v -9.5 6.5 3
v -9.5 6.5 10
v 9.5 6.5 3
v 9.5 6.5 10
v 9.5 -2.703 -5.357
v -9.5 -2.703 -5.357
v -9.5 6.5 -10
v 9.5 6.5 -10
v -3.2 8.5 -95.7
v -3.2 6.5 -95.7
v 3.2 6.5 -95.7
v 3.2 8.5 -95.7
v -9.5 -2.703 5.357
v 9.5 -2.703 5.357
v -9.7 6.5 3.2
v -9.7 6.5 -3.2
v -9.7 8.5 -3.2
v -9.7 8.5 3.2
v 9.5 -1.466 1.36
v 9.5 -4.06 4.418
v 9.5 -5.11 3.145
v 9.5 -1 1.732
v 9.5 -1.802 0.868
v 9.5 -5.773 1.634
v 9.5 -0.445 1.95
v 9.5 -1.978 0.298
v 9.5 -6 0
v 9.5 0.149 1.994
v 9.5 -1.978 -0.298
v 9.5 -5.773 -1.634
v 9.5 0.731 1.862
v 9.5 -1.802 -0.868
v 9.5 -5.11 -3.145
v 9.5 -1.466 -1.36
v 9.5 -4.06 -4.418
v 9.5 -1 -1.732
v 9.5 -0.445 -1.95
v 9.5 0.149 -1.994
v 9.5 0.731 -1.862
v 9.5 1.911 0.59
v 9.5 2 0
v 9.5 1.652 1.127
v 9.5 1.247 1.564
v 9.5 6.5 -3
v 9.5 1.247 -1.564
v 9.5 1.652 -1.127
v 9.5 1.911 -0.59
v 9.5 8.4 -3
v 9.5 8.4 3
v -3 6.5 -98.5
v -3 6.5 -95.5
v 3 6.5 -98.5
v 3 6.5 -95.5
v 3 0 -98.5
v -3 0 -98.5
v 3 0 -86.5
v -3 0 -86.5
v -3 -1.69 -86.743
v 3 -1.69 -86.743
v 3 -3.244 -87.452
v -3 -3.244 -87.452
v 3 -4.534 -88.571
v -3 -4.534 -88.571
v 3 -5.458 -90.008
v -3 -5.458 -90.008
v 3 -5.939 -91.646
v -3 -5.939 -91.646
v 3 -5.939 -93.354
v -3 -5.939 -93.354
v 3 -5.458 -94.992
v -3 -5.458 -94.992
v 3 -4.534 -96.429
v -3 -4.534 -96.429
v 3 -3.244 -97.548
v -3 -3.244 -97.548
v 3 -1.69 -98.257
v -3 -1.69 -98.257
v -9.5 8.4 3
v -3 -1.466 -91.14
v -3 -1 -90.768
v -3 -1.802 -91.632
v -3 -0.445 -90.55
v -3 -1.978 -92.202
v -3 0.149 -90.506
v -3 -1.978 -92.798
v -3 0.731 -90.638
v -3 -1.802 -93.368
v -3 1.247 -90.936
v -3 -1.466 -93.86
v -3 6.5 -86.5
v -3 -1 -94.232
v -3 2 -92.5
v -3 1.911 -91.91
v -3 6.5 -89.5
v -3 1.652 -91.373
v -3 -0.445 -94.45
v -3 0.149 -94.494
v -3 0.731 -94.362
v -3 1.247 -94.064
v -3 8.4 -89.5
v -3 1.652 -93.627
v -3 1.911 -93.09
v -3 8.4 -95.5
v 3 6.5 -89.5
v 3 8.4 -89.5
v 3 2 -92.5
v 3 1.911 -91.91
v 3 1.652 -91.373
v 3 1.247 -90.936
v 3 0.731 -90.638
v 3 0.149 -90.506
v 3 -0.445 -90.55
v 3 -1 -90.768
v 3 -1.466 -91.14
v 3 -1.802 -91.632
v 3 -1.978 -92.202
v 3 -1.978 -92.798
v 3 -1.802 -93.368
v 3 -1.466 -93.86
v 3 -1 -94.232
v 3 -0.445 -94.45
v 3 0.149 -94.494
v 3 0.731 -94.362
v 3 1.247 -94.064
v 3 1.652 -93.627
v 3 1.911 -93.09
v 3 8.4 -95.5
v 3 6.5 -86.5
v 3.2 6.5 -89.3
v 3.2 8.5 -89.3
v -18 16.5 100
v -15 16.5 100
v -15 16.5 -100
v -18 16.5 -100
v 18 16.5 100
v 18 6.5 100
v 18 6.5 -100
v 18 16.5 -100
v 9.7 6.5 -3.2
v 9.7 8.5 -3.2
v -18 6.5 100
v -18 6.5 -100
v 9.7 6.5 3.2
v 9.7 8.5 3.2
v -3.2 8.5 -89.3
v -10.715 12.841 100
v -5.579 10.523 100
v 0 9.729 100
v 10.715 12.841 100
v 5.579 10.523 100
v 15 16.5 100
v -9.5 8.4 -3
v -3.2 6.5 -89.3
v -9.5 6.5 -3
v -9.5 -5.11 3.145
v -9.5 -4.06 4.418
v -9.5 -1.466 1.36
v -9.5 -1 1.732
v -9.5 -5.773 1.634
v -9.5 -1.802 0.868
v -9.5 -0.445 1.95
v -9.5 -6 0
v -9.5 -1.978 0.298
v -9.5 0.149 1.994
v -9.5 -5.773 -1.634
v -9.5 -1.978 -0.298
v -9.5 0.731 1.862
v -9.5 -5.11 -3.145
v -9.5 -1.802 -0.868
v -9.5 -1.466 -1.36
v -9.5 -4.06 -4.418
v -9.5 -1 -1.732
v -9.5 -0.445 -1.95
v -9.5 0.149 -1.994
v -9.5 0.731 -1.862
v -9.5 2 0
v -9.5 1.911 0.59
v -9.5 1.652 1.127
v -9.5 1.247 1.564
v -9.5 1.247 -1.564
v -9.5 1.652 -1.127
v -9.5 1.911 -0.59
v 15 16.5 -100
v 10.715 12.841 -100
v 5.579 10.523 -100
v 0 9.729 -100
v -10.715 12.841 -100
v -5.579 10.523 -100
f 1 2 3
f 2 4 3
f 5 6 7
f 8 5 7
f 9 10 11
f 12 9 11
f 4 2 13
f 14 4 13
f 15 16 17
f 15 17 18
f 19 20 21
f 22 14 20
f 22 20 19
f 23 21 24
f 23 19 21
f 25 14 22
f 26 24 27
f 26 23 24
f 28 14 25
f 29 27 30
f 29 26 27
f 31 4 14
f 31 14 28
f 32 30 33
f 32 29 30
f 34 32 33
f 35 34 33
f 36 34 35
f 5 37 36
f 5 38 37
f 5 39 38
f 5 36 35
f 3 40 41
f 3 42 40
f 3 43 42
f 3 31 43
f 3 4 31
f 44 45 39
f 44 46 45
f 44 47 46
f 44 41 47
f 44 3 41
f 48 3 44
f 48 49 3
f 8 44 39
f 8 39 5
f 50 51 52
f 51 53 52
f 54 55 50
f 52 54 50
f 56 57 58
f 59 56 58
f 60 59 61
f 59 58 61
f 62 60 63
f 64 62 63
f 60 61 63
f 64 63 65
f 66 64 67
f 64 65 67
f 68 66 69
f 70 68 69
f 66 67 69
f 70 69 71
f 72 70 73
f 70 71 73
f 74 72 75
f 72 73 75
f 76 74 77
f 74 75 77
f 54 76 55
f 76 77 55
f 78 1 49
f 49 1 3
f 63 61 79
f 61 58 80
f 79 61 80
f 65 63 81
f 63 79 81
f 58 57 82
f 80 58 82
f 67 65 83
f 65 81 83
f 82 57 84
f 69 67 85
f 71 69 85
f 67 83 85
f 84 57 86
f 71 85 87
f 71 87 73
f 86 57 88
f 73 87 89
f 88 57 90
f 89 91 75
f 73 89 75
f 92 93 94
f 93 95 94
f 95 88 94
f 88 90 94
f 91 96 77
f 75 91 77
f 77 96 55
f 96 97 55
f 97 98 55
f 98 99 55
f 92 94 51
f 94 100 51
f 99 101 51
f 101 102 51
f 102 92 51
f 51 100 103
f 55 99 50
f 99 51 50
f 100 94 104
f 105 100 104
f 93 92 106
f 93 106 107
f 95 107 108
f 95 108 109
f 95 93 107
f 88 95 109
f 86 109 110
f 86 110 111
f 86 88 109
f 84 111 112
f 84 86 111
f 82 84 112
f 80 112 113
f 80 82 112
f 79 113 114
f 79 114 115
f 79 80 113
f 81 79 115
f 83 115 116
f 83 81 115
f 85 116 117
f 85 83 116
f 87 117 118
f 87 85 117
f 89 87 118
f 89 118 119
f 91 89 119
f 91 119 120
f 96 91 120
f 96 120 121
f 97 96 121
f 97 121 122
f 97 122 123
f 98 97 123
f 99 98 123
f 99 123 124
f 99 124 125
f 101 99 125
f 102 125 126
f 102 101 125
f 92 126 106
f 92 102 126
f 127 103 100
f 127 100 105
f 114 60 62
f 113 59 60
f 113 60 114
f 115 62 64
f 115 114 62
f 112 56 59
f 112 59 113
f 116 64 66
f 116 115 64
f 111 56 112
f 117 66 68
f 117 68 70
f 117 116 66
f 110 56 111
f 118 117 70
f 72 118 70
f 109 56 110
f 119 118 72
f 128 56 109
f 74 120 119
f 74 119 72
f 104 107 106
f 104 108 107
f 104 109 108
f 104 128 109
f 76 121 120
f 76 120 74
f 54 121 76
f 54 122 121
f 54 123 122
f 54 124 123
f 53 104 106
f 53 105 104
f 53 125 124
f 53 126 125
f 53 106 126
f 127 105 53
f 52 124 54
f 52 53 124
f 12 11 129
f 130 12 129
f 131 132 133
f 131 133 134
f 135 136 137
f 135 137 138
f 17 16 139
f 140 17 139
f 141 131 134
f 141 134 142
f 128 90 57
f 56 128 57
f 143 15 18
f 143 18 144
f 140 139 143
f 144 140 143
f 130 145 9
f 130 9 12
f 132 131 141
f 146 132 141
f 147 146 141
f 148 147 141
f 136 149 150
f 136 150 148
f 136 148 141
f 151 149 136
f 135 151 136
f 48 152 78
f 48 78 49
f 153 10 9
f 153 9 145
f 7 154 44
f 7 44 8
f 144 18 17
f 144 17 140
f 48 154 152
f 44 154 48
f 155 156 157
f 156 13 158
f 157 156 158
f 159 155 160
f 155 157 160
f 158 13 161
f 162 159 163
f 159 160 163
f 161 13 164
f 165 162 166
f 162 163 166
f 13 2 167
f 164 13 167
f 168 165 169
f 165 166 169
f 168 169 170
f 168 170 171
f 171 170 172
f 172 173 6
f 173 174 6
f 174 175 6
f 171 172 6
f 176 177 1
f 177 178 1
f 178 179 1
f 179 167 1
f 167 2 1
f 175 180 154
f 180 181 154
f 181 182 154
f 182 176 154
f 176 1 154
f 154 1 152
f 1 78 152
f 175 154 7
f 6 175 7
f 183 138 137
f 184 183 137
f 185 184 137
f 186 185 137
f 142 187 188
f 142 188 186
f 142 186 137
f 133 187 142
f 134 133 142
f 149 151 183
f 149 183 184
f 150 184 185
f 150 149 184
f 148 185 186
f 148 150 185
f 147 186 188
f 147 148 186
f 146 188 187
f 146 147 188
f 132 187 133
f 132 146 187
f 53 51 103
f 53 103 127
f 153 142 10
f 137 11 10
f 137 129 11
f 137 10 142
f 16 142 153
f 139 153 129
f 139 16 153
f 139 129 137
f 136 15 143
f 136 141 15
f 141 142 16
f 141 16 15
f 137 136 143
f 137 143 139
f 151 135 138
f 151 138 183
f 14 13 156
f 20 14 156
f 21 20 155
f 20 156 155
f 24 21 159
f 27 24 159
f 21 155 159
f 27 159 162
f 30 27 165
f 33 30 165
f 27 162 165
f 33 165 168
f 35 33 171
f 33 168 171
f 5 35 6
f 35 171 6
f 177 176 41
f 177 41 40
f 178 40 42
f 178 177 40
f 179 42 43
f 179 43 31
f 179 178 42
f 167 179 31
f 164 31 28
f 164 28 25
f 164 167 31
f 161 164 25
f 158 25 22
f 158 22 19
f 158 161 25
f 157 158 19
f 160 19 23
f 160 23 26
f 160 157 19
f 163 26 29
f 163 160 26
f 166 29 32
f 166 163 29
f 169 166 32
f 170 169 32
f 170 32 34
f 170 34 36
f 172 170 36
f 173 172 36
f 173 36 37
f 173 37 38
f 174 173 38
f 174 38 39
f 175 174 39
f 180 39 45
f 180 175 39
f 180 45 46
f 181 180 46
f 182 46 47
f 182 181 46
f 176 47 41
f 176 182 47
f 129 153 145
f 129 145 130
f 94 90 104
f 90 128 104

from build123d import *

# Parameters (mm, degrees)
THICKEN1_START           = -92.5
THICKEN1_OUTLINE_W       = 30
THICKEN1_OUTLINE_H       = 4.5
THICKEN1_DEPTH           = 185
THICKEN2_START           = -92.5
THICKEN2_OUTLINE_W       = 3
THICKEN2_OUTLINE_H       = 18
THICKEN2_DEPTH           = 185
THICKEN3_START           = -92.5
THICKEN3_OUTLINE_W       = 3
THICKEN3_OUTLINE_H       = 18
THICKEN3_DEPTH           = 185
BOSS_EXTRUDE1_DEPTH      = 185
SKETCH7_W                = 36
SKETCH7_H                = 8
CUT_EXTRUDE1_DEPTH       = 187.604528348
BOSS_EXTRUDE2_DEPTH      = 7.5
BOSS_EXTRUDE3_START      = 7.5
BOSS_EXTRUDE3_DEPTH      = 7.5
BOSS_EXTRUDE4_DEPTH      = 9.5
BOSS_EXTRUDE4_DEPTH_BACK = 9.5
SKETCH10_R               = 6
SKETCH10_R_2             = 2
BOSS_EXTRUDE5_DEPTH      = 3
BOSS_EXTRUDE5_DEPTH_BACK = 3
SKETCH11_R               = 6
SKETCH11_R_2             = 2
SKETCH12_W               = 19.4
SKETCH12_H               = 6.4
SKETCH12_W_2             = 6.4
CUT_EXTRUDE2_DEPTH       = 2
SKETCH13_W               = 6
SKETCH13_H               = 6
SKETCH13_W_2             = 19
BOSS_EXTRUDE6_DEPTH      = 1.9


# Read off the part's stored shape, not the designer's step: Thicken1, Thicken2, Thicken3
with BuildPart() as part:
    # Thicken1 outline → Thicken1 (new body)
    with BuildSketch(Plane.XY.offset(THICKEN1_START)):
        with Locations((0, 0.75)):
            Rectangle(THICKEN1_OUTLINE_W, THICKEN1_OUTLINE_H)
    extrude(amount=THICKEN1_DEPTH)

    # Thicken2 outline → Thicken2 (add)
    with BuildSketch(Plane.XY.offset(THICKEN2_START)):
        with Locations((16.5, 7.5)):
            Rectangle(THICKEN2_OUTLINE_W, THICKEN2_OUTLINE_H)
    extrude(amount=THICKEN2_DEPTH)

    # Thicken3 outline → Thicken3 (add)
    with BuildSketch(Plane.XY.offset(THICKEN3_START)):
        with Locations((-16.5, 7.5)):
            Rectangle(THICKEN3_OUTLINE_W, THICKEN3_OUTLINE_H)
    extrude(amount=THICKEN3_DEPTH)

    # Sketch4 → Boss-Extrude1 (add)
    with BuildSketch(Plane.XY.offset(92.5)):
        with BuildLine():
            Line((-15, 16.5), (-15, 3))
            Line((-15, 3), (15, 3))
            Line((15, 3), (15, 16.5))
            ThreePointArc((15, 16.5), (0, 9.728756555), (-15, 16.5))
        make_face()
    extrude(amount=-BOSS_EXTRUDE1_DEPTH)

    # Sketch7 → Cut-Extrude1 (cut, through all)
    with BuildSketch(Plane(origin=(0, 0, -92.5), x_dir=(-1, 0, 0), z_dir=(0, 0, -1))):
        with Locations((0, 2.5)):
            Rectangle(SKETCH7_W, SKETCH7_H)
    extrude(amount=-CUT_EXTRUDE1_DEPTH, mode=Mode.SUBTRACT)

    # Sketch8 → Boss-Extrude2 (add)
    with BuildSketch(Plane(origin=(0, 0, -92.5), x_dir=(-1, 0, 0), z_dir=(0, 0, -1))):
        with BuildLine():
            Line((-18, 6.5), (18, 6.5))
            Line((18, 6.5), (18, 16.5))
            Line((18, 16.5), (15, 16.5))
            ThreePointArc((15, 16.5), (0, 9.728756555), (-15, 16.5))
            Line((-15, 16.5), (-18, 16.5))
            Line((-18, 16.5), (-18, 6.5))
        make_face()
    extrude(amount=BOSS_EXTRUDE2_DEPTH)

    # Sketch9 → Boss-Extrude3 (add)
    with BuildSketch(Plane.XY.offset(92.5).offset(BOSS_EXTRUDE3_START)):
        with BuildLine():
            Line((-18, 6.5), (18, 6.5))
            Line((18, 6.5), (18, 16.5))
            Line((18, 16.5), (15, 16.5))
            ThreePointArc((15, 16.5), (0, 9.728756555), (-15, 16.5))
            Line((-15, 16.5), (-18, 16.5))
            Line((-18, 16.5), (-18, 6.5))
        make_face()
    extrude(amount=-BOSS_EXTRUDE3_DEPTH)

    # Sketch10 → Boss-Extrude4 (add, two sides: drawn at the far end of the back side and taken through both)
    # profile 1 of 2: a face of its own
    with BuildSketch(Plane(origin=(0, 0, 0), x_dir=(0, 0, -1), z_dir=(1, 0, 0)).offset(-BOSS_EXTRUDE4_DEPTH_BACK)):
        Circle(SKETCH10_R)
        with Locations(Location((0, 0, 0), (0, 0, 90))):
            Circle(SKETCH10_R_2, mode=Mode.SUBTRACT)
    # profile 2 of 2: a face of its own
    with BuildSketch(Plane(origin=(0, 0, 0), x_dir=(0, 0, -1), z_dir=(1, 0, 0)).offset(-BOSS_EXTRUDE4_DEPTH_BACK)):
        with BuildLine():
            Line((10, 6.5), (-10, 6.5))
            Line((-10, 6.5), (-5.35678593, -2.702747584))
            ThreePointArc((-5.35678593, -2.702747584), (-1.389115622, 5.836981908), (6, 0))
            ThreePointArc((6, 0), (5.836981908, -1.389115622), (5.35678593, -2.702747584))
            Line((5.35678593, -2.702747584), (10, 6.5))
        make_face()
    extrude(amount=BOSS_EXTRUDE4_DEPTH + BOSS_EXTRUDE4_DEPTH_BACK)

    # Sketch11 → Boss-Extrude5 (add, two sides: drawn at the far end of the back side and taken through both)
    # profile 1 of 2: a face of its own
    with BuildSketch(Plane(origin=(0, 0, 0), x_dir=(0, 0, -1), z_dir=(1, 0, 0)).offset(-BOSS_EXTRUDE5_DEPTH_BACK)):
        with Locations((92.5, 0)):
            Circle(SKETCH11_R)
        with Locations(Location((92.5, 0, 0), (0, 0, 90))):
            Circle(SKETCH11_R_2, mode=Mode.SUBTRACT)
    # profile 2 of 2: a face of its own
    with BuildSketch(Plane(origin=(0, 0, 0), x_dir=(0, 0, -1), z_dir=(1, 0, 0)).offset(-BOSS_EXTRUDE5_DEPTH_BACK)):
        with BuildLine():
            ThreePointArc((86.5, 0), (92.5, 6), (98.5, 0))
            Line((98.5, 0), (98.5, 6.5))
            Line((98.5, 6.5), (86.5, 6.5))
            Line((86.5, 6.5), (86.5, 0))
        make_face()
    extrude(amount=BOSS_EXTRUDE5_DEPTH + BOSS_EXTRUDE5_DEPTH_BACK)


with BuildPart() as body_2:
    # Split1: the piece on the far side of the plane
    add(part.part)
    split(bisect_by=Plane(origin=(0, 6.5, 0), x_dir=(0, 0, -1), z_dir=(0, -1, 0)), keep=Keep.BOTTOM)

    # Sketch12 → Cut-Extrude2 (cut)
    with BuildSketch(Plane.XZ.offset(-6.5)):
        Rectangle(SKETCH12_W, SKETCH12_H)
        with Locations((0, -92.5)):
            Rectangle(SKETCH12_W_2, SKETCH12_H)
    extrude(amount=-CUT_EXTRUDE2_DEPTH, mode=Mode.SUBTRACT)


with BuildPart() as part_1:
    add(part.part)

    # Split1
    split(bisect_by=Plane(origin=(0, 6.5, 0), x_dir=(0, 0, -1), z_dir=(0, -1, 0)), keep=Keep.TOP)

    # Sketch13 → Boss-Extrude6 (add)
    with BuildSketch(Plane(origin=(0, 6.5, 0), x_dir=(1, 0, 0), z_dir=(0, 1, 0))):
        with Locations((0, 92.5)):
            Rectangle(SKETCH13_W, SKETCH13_H)
        Rectangle(SKETCH13_W_2, SKETCH13_H)
    extrude(amount=BOSS_EXTRUDE6_DEPTH)


solid = Compound([body_2.part, part_1.part])
